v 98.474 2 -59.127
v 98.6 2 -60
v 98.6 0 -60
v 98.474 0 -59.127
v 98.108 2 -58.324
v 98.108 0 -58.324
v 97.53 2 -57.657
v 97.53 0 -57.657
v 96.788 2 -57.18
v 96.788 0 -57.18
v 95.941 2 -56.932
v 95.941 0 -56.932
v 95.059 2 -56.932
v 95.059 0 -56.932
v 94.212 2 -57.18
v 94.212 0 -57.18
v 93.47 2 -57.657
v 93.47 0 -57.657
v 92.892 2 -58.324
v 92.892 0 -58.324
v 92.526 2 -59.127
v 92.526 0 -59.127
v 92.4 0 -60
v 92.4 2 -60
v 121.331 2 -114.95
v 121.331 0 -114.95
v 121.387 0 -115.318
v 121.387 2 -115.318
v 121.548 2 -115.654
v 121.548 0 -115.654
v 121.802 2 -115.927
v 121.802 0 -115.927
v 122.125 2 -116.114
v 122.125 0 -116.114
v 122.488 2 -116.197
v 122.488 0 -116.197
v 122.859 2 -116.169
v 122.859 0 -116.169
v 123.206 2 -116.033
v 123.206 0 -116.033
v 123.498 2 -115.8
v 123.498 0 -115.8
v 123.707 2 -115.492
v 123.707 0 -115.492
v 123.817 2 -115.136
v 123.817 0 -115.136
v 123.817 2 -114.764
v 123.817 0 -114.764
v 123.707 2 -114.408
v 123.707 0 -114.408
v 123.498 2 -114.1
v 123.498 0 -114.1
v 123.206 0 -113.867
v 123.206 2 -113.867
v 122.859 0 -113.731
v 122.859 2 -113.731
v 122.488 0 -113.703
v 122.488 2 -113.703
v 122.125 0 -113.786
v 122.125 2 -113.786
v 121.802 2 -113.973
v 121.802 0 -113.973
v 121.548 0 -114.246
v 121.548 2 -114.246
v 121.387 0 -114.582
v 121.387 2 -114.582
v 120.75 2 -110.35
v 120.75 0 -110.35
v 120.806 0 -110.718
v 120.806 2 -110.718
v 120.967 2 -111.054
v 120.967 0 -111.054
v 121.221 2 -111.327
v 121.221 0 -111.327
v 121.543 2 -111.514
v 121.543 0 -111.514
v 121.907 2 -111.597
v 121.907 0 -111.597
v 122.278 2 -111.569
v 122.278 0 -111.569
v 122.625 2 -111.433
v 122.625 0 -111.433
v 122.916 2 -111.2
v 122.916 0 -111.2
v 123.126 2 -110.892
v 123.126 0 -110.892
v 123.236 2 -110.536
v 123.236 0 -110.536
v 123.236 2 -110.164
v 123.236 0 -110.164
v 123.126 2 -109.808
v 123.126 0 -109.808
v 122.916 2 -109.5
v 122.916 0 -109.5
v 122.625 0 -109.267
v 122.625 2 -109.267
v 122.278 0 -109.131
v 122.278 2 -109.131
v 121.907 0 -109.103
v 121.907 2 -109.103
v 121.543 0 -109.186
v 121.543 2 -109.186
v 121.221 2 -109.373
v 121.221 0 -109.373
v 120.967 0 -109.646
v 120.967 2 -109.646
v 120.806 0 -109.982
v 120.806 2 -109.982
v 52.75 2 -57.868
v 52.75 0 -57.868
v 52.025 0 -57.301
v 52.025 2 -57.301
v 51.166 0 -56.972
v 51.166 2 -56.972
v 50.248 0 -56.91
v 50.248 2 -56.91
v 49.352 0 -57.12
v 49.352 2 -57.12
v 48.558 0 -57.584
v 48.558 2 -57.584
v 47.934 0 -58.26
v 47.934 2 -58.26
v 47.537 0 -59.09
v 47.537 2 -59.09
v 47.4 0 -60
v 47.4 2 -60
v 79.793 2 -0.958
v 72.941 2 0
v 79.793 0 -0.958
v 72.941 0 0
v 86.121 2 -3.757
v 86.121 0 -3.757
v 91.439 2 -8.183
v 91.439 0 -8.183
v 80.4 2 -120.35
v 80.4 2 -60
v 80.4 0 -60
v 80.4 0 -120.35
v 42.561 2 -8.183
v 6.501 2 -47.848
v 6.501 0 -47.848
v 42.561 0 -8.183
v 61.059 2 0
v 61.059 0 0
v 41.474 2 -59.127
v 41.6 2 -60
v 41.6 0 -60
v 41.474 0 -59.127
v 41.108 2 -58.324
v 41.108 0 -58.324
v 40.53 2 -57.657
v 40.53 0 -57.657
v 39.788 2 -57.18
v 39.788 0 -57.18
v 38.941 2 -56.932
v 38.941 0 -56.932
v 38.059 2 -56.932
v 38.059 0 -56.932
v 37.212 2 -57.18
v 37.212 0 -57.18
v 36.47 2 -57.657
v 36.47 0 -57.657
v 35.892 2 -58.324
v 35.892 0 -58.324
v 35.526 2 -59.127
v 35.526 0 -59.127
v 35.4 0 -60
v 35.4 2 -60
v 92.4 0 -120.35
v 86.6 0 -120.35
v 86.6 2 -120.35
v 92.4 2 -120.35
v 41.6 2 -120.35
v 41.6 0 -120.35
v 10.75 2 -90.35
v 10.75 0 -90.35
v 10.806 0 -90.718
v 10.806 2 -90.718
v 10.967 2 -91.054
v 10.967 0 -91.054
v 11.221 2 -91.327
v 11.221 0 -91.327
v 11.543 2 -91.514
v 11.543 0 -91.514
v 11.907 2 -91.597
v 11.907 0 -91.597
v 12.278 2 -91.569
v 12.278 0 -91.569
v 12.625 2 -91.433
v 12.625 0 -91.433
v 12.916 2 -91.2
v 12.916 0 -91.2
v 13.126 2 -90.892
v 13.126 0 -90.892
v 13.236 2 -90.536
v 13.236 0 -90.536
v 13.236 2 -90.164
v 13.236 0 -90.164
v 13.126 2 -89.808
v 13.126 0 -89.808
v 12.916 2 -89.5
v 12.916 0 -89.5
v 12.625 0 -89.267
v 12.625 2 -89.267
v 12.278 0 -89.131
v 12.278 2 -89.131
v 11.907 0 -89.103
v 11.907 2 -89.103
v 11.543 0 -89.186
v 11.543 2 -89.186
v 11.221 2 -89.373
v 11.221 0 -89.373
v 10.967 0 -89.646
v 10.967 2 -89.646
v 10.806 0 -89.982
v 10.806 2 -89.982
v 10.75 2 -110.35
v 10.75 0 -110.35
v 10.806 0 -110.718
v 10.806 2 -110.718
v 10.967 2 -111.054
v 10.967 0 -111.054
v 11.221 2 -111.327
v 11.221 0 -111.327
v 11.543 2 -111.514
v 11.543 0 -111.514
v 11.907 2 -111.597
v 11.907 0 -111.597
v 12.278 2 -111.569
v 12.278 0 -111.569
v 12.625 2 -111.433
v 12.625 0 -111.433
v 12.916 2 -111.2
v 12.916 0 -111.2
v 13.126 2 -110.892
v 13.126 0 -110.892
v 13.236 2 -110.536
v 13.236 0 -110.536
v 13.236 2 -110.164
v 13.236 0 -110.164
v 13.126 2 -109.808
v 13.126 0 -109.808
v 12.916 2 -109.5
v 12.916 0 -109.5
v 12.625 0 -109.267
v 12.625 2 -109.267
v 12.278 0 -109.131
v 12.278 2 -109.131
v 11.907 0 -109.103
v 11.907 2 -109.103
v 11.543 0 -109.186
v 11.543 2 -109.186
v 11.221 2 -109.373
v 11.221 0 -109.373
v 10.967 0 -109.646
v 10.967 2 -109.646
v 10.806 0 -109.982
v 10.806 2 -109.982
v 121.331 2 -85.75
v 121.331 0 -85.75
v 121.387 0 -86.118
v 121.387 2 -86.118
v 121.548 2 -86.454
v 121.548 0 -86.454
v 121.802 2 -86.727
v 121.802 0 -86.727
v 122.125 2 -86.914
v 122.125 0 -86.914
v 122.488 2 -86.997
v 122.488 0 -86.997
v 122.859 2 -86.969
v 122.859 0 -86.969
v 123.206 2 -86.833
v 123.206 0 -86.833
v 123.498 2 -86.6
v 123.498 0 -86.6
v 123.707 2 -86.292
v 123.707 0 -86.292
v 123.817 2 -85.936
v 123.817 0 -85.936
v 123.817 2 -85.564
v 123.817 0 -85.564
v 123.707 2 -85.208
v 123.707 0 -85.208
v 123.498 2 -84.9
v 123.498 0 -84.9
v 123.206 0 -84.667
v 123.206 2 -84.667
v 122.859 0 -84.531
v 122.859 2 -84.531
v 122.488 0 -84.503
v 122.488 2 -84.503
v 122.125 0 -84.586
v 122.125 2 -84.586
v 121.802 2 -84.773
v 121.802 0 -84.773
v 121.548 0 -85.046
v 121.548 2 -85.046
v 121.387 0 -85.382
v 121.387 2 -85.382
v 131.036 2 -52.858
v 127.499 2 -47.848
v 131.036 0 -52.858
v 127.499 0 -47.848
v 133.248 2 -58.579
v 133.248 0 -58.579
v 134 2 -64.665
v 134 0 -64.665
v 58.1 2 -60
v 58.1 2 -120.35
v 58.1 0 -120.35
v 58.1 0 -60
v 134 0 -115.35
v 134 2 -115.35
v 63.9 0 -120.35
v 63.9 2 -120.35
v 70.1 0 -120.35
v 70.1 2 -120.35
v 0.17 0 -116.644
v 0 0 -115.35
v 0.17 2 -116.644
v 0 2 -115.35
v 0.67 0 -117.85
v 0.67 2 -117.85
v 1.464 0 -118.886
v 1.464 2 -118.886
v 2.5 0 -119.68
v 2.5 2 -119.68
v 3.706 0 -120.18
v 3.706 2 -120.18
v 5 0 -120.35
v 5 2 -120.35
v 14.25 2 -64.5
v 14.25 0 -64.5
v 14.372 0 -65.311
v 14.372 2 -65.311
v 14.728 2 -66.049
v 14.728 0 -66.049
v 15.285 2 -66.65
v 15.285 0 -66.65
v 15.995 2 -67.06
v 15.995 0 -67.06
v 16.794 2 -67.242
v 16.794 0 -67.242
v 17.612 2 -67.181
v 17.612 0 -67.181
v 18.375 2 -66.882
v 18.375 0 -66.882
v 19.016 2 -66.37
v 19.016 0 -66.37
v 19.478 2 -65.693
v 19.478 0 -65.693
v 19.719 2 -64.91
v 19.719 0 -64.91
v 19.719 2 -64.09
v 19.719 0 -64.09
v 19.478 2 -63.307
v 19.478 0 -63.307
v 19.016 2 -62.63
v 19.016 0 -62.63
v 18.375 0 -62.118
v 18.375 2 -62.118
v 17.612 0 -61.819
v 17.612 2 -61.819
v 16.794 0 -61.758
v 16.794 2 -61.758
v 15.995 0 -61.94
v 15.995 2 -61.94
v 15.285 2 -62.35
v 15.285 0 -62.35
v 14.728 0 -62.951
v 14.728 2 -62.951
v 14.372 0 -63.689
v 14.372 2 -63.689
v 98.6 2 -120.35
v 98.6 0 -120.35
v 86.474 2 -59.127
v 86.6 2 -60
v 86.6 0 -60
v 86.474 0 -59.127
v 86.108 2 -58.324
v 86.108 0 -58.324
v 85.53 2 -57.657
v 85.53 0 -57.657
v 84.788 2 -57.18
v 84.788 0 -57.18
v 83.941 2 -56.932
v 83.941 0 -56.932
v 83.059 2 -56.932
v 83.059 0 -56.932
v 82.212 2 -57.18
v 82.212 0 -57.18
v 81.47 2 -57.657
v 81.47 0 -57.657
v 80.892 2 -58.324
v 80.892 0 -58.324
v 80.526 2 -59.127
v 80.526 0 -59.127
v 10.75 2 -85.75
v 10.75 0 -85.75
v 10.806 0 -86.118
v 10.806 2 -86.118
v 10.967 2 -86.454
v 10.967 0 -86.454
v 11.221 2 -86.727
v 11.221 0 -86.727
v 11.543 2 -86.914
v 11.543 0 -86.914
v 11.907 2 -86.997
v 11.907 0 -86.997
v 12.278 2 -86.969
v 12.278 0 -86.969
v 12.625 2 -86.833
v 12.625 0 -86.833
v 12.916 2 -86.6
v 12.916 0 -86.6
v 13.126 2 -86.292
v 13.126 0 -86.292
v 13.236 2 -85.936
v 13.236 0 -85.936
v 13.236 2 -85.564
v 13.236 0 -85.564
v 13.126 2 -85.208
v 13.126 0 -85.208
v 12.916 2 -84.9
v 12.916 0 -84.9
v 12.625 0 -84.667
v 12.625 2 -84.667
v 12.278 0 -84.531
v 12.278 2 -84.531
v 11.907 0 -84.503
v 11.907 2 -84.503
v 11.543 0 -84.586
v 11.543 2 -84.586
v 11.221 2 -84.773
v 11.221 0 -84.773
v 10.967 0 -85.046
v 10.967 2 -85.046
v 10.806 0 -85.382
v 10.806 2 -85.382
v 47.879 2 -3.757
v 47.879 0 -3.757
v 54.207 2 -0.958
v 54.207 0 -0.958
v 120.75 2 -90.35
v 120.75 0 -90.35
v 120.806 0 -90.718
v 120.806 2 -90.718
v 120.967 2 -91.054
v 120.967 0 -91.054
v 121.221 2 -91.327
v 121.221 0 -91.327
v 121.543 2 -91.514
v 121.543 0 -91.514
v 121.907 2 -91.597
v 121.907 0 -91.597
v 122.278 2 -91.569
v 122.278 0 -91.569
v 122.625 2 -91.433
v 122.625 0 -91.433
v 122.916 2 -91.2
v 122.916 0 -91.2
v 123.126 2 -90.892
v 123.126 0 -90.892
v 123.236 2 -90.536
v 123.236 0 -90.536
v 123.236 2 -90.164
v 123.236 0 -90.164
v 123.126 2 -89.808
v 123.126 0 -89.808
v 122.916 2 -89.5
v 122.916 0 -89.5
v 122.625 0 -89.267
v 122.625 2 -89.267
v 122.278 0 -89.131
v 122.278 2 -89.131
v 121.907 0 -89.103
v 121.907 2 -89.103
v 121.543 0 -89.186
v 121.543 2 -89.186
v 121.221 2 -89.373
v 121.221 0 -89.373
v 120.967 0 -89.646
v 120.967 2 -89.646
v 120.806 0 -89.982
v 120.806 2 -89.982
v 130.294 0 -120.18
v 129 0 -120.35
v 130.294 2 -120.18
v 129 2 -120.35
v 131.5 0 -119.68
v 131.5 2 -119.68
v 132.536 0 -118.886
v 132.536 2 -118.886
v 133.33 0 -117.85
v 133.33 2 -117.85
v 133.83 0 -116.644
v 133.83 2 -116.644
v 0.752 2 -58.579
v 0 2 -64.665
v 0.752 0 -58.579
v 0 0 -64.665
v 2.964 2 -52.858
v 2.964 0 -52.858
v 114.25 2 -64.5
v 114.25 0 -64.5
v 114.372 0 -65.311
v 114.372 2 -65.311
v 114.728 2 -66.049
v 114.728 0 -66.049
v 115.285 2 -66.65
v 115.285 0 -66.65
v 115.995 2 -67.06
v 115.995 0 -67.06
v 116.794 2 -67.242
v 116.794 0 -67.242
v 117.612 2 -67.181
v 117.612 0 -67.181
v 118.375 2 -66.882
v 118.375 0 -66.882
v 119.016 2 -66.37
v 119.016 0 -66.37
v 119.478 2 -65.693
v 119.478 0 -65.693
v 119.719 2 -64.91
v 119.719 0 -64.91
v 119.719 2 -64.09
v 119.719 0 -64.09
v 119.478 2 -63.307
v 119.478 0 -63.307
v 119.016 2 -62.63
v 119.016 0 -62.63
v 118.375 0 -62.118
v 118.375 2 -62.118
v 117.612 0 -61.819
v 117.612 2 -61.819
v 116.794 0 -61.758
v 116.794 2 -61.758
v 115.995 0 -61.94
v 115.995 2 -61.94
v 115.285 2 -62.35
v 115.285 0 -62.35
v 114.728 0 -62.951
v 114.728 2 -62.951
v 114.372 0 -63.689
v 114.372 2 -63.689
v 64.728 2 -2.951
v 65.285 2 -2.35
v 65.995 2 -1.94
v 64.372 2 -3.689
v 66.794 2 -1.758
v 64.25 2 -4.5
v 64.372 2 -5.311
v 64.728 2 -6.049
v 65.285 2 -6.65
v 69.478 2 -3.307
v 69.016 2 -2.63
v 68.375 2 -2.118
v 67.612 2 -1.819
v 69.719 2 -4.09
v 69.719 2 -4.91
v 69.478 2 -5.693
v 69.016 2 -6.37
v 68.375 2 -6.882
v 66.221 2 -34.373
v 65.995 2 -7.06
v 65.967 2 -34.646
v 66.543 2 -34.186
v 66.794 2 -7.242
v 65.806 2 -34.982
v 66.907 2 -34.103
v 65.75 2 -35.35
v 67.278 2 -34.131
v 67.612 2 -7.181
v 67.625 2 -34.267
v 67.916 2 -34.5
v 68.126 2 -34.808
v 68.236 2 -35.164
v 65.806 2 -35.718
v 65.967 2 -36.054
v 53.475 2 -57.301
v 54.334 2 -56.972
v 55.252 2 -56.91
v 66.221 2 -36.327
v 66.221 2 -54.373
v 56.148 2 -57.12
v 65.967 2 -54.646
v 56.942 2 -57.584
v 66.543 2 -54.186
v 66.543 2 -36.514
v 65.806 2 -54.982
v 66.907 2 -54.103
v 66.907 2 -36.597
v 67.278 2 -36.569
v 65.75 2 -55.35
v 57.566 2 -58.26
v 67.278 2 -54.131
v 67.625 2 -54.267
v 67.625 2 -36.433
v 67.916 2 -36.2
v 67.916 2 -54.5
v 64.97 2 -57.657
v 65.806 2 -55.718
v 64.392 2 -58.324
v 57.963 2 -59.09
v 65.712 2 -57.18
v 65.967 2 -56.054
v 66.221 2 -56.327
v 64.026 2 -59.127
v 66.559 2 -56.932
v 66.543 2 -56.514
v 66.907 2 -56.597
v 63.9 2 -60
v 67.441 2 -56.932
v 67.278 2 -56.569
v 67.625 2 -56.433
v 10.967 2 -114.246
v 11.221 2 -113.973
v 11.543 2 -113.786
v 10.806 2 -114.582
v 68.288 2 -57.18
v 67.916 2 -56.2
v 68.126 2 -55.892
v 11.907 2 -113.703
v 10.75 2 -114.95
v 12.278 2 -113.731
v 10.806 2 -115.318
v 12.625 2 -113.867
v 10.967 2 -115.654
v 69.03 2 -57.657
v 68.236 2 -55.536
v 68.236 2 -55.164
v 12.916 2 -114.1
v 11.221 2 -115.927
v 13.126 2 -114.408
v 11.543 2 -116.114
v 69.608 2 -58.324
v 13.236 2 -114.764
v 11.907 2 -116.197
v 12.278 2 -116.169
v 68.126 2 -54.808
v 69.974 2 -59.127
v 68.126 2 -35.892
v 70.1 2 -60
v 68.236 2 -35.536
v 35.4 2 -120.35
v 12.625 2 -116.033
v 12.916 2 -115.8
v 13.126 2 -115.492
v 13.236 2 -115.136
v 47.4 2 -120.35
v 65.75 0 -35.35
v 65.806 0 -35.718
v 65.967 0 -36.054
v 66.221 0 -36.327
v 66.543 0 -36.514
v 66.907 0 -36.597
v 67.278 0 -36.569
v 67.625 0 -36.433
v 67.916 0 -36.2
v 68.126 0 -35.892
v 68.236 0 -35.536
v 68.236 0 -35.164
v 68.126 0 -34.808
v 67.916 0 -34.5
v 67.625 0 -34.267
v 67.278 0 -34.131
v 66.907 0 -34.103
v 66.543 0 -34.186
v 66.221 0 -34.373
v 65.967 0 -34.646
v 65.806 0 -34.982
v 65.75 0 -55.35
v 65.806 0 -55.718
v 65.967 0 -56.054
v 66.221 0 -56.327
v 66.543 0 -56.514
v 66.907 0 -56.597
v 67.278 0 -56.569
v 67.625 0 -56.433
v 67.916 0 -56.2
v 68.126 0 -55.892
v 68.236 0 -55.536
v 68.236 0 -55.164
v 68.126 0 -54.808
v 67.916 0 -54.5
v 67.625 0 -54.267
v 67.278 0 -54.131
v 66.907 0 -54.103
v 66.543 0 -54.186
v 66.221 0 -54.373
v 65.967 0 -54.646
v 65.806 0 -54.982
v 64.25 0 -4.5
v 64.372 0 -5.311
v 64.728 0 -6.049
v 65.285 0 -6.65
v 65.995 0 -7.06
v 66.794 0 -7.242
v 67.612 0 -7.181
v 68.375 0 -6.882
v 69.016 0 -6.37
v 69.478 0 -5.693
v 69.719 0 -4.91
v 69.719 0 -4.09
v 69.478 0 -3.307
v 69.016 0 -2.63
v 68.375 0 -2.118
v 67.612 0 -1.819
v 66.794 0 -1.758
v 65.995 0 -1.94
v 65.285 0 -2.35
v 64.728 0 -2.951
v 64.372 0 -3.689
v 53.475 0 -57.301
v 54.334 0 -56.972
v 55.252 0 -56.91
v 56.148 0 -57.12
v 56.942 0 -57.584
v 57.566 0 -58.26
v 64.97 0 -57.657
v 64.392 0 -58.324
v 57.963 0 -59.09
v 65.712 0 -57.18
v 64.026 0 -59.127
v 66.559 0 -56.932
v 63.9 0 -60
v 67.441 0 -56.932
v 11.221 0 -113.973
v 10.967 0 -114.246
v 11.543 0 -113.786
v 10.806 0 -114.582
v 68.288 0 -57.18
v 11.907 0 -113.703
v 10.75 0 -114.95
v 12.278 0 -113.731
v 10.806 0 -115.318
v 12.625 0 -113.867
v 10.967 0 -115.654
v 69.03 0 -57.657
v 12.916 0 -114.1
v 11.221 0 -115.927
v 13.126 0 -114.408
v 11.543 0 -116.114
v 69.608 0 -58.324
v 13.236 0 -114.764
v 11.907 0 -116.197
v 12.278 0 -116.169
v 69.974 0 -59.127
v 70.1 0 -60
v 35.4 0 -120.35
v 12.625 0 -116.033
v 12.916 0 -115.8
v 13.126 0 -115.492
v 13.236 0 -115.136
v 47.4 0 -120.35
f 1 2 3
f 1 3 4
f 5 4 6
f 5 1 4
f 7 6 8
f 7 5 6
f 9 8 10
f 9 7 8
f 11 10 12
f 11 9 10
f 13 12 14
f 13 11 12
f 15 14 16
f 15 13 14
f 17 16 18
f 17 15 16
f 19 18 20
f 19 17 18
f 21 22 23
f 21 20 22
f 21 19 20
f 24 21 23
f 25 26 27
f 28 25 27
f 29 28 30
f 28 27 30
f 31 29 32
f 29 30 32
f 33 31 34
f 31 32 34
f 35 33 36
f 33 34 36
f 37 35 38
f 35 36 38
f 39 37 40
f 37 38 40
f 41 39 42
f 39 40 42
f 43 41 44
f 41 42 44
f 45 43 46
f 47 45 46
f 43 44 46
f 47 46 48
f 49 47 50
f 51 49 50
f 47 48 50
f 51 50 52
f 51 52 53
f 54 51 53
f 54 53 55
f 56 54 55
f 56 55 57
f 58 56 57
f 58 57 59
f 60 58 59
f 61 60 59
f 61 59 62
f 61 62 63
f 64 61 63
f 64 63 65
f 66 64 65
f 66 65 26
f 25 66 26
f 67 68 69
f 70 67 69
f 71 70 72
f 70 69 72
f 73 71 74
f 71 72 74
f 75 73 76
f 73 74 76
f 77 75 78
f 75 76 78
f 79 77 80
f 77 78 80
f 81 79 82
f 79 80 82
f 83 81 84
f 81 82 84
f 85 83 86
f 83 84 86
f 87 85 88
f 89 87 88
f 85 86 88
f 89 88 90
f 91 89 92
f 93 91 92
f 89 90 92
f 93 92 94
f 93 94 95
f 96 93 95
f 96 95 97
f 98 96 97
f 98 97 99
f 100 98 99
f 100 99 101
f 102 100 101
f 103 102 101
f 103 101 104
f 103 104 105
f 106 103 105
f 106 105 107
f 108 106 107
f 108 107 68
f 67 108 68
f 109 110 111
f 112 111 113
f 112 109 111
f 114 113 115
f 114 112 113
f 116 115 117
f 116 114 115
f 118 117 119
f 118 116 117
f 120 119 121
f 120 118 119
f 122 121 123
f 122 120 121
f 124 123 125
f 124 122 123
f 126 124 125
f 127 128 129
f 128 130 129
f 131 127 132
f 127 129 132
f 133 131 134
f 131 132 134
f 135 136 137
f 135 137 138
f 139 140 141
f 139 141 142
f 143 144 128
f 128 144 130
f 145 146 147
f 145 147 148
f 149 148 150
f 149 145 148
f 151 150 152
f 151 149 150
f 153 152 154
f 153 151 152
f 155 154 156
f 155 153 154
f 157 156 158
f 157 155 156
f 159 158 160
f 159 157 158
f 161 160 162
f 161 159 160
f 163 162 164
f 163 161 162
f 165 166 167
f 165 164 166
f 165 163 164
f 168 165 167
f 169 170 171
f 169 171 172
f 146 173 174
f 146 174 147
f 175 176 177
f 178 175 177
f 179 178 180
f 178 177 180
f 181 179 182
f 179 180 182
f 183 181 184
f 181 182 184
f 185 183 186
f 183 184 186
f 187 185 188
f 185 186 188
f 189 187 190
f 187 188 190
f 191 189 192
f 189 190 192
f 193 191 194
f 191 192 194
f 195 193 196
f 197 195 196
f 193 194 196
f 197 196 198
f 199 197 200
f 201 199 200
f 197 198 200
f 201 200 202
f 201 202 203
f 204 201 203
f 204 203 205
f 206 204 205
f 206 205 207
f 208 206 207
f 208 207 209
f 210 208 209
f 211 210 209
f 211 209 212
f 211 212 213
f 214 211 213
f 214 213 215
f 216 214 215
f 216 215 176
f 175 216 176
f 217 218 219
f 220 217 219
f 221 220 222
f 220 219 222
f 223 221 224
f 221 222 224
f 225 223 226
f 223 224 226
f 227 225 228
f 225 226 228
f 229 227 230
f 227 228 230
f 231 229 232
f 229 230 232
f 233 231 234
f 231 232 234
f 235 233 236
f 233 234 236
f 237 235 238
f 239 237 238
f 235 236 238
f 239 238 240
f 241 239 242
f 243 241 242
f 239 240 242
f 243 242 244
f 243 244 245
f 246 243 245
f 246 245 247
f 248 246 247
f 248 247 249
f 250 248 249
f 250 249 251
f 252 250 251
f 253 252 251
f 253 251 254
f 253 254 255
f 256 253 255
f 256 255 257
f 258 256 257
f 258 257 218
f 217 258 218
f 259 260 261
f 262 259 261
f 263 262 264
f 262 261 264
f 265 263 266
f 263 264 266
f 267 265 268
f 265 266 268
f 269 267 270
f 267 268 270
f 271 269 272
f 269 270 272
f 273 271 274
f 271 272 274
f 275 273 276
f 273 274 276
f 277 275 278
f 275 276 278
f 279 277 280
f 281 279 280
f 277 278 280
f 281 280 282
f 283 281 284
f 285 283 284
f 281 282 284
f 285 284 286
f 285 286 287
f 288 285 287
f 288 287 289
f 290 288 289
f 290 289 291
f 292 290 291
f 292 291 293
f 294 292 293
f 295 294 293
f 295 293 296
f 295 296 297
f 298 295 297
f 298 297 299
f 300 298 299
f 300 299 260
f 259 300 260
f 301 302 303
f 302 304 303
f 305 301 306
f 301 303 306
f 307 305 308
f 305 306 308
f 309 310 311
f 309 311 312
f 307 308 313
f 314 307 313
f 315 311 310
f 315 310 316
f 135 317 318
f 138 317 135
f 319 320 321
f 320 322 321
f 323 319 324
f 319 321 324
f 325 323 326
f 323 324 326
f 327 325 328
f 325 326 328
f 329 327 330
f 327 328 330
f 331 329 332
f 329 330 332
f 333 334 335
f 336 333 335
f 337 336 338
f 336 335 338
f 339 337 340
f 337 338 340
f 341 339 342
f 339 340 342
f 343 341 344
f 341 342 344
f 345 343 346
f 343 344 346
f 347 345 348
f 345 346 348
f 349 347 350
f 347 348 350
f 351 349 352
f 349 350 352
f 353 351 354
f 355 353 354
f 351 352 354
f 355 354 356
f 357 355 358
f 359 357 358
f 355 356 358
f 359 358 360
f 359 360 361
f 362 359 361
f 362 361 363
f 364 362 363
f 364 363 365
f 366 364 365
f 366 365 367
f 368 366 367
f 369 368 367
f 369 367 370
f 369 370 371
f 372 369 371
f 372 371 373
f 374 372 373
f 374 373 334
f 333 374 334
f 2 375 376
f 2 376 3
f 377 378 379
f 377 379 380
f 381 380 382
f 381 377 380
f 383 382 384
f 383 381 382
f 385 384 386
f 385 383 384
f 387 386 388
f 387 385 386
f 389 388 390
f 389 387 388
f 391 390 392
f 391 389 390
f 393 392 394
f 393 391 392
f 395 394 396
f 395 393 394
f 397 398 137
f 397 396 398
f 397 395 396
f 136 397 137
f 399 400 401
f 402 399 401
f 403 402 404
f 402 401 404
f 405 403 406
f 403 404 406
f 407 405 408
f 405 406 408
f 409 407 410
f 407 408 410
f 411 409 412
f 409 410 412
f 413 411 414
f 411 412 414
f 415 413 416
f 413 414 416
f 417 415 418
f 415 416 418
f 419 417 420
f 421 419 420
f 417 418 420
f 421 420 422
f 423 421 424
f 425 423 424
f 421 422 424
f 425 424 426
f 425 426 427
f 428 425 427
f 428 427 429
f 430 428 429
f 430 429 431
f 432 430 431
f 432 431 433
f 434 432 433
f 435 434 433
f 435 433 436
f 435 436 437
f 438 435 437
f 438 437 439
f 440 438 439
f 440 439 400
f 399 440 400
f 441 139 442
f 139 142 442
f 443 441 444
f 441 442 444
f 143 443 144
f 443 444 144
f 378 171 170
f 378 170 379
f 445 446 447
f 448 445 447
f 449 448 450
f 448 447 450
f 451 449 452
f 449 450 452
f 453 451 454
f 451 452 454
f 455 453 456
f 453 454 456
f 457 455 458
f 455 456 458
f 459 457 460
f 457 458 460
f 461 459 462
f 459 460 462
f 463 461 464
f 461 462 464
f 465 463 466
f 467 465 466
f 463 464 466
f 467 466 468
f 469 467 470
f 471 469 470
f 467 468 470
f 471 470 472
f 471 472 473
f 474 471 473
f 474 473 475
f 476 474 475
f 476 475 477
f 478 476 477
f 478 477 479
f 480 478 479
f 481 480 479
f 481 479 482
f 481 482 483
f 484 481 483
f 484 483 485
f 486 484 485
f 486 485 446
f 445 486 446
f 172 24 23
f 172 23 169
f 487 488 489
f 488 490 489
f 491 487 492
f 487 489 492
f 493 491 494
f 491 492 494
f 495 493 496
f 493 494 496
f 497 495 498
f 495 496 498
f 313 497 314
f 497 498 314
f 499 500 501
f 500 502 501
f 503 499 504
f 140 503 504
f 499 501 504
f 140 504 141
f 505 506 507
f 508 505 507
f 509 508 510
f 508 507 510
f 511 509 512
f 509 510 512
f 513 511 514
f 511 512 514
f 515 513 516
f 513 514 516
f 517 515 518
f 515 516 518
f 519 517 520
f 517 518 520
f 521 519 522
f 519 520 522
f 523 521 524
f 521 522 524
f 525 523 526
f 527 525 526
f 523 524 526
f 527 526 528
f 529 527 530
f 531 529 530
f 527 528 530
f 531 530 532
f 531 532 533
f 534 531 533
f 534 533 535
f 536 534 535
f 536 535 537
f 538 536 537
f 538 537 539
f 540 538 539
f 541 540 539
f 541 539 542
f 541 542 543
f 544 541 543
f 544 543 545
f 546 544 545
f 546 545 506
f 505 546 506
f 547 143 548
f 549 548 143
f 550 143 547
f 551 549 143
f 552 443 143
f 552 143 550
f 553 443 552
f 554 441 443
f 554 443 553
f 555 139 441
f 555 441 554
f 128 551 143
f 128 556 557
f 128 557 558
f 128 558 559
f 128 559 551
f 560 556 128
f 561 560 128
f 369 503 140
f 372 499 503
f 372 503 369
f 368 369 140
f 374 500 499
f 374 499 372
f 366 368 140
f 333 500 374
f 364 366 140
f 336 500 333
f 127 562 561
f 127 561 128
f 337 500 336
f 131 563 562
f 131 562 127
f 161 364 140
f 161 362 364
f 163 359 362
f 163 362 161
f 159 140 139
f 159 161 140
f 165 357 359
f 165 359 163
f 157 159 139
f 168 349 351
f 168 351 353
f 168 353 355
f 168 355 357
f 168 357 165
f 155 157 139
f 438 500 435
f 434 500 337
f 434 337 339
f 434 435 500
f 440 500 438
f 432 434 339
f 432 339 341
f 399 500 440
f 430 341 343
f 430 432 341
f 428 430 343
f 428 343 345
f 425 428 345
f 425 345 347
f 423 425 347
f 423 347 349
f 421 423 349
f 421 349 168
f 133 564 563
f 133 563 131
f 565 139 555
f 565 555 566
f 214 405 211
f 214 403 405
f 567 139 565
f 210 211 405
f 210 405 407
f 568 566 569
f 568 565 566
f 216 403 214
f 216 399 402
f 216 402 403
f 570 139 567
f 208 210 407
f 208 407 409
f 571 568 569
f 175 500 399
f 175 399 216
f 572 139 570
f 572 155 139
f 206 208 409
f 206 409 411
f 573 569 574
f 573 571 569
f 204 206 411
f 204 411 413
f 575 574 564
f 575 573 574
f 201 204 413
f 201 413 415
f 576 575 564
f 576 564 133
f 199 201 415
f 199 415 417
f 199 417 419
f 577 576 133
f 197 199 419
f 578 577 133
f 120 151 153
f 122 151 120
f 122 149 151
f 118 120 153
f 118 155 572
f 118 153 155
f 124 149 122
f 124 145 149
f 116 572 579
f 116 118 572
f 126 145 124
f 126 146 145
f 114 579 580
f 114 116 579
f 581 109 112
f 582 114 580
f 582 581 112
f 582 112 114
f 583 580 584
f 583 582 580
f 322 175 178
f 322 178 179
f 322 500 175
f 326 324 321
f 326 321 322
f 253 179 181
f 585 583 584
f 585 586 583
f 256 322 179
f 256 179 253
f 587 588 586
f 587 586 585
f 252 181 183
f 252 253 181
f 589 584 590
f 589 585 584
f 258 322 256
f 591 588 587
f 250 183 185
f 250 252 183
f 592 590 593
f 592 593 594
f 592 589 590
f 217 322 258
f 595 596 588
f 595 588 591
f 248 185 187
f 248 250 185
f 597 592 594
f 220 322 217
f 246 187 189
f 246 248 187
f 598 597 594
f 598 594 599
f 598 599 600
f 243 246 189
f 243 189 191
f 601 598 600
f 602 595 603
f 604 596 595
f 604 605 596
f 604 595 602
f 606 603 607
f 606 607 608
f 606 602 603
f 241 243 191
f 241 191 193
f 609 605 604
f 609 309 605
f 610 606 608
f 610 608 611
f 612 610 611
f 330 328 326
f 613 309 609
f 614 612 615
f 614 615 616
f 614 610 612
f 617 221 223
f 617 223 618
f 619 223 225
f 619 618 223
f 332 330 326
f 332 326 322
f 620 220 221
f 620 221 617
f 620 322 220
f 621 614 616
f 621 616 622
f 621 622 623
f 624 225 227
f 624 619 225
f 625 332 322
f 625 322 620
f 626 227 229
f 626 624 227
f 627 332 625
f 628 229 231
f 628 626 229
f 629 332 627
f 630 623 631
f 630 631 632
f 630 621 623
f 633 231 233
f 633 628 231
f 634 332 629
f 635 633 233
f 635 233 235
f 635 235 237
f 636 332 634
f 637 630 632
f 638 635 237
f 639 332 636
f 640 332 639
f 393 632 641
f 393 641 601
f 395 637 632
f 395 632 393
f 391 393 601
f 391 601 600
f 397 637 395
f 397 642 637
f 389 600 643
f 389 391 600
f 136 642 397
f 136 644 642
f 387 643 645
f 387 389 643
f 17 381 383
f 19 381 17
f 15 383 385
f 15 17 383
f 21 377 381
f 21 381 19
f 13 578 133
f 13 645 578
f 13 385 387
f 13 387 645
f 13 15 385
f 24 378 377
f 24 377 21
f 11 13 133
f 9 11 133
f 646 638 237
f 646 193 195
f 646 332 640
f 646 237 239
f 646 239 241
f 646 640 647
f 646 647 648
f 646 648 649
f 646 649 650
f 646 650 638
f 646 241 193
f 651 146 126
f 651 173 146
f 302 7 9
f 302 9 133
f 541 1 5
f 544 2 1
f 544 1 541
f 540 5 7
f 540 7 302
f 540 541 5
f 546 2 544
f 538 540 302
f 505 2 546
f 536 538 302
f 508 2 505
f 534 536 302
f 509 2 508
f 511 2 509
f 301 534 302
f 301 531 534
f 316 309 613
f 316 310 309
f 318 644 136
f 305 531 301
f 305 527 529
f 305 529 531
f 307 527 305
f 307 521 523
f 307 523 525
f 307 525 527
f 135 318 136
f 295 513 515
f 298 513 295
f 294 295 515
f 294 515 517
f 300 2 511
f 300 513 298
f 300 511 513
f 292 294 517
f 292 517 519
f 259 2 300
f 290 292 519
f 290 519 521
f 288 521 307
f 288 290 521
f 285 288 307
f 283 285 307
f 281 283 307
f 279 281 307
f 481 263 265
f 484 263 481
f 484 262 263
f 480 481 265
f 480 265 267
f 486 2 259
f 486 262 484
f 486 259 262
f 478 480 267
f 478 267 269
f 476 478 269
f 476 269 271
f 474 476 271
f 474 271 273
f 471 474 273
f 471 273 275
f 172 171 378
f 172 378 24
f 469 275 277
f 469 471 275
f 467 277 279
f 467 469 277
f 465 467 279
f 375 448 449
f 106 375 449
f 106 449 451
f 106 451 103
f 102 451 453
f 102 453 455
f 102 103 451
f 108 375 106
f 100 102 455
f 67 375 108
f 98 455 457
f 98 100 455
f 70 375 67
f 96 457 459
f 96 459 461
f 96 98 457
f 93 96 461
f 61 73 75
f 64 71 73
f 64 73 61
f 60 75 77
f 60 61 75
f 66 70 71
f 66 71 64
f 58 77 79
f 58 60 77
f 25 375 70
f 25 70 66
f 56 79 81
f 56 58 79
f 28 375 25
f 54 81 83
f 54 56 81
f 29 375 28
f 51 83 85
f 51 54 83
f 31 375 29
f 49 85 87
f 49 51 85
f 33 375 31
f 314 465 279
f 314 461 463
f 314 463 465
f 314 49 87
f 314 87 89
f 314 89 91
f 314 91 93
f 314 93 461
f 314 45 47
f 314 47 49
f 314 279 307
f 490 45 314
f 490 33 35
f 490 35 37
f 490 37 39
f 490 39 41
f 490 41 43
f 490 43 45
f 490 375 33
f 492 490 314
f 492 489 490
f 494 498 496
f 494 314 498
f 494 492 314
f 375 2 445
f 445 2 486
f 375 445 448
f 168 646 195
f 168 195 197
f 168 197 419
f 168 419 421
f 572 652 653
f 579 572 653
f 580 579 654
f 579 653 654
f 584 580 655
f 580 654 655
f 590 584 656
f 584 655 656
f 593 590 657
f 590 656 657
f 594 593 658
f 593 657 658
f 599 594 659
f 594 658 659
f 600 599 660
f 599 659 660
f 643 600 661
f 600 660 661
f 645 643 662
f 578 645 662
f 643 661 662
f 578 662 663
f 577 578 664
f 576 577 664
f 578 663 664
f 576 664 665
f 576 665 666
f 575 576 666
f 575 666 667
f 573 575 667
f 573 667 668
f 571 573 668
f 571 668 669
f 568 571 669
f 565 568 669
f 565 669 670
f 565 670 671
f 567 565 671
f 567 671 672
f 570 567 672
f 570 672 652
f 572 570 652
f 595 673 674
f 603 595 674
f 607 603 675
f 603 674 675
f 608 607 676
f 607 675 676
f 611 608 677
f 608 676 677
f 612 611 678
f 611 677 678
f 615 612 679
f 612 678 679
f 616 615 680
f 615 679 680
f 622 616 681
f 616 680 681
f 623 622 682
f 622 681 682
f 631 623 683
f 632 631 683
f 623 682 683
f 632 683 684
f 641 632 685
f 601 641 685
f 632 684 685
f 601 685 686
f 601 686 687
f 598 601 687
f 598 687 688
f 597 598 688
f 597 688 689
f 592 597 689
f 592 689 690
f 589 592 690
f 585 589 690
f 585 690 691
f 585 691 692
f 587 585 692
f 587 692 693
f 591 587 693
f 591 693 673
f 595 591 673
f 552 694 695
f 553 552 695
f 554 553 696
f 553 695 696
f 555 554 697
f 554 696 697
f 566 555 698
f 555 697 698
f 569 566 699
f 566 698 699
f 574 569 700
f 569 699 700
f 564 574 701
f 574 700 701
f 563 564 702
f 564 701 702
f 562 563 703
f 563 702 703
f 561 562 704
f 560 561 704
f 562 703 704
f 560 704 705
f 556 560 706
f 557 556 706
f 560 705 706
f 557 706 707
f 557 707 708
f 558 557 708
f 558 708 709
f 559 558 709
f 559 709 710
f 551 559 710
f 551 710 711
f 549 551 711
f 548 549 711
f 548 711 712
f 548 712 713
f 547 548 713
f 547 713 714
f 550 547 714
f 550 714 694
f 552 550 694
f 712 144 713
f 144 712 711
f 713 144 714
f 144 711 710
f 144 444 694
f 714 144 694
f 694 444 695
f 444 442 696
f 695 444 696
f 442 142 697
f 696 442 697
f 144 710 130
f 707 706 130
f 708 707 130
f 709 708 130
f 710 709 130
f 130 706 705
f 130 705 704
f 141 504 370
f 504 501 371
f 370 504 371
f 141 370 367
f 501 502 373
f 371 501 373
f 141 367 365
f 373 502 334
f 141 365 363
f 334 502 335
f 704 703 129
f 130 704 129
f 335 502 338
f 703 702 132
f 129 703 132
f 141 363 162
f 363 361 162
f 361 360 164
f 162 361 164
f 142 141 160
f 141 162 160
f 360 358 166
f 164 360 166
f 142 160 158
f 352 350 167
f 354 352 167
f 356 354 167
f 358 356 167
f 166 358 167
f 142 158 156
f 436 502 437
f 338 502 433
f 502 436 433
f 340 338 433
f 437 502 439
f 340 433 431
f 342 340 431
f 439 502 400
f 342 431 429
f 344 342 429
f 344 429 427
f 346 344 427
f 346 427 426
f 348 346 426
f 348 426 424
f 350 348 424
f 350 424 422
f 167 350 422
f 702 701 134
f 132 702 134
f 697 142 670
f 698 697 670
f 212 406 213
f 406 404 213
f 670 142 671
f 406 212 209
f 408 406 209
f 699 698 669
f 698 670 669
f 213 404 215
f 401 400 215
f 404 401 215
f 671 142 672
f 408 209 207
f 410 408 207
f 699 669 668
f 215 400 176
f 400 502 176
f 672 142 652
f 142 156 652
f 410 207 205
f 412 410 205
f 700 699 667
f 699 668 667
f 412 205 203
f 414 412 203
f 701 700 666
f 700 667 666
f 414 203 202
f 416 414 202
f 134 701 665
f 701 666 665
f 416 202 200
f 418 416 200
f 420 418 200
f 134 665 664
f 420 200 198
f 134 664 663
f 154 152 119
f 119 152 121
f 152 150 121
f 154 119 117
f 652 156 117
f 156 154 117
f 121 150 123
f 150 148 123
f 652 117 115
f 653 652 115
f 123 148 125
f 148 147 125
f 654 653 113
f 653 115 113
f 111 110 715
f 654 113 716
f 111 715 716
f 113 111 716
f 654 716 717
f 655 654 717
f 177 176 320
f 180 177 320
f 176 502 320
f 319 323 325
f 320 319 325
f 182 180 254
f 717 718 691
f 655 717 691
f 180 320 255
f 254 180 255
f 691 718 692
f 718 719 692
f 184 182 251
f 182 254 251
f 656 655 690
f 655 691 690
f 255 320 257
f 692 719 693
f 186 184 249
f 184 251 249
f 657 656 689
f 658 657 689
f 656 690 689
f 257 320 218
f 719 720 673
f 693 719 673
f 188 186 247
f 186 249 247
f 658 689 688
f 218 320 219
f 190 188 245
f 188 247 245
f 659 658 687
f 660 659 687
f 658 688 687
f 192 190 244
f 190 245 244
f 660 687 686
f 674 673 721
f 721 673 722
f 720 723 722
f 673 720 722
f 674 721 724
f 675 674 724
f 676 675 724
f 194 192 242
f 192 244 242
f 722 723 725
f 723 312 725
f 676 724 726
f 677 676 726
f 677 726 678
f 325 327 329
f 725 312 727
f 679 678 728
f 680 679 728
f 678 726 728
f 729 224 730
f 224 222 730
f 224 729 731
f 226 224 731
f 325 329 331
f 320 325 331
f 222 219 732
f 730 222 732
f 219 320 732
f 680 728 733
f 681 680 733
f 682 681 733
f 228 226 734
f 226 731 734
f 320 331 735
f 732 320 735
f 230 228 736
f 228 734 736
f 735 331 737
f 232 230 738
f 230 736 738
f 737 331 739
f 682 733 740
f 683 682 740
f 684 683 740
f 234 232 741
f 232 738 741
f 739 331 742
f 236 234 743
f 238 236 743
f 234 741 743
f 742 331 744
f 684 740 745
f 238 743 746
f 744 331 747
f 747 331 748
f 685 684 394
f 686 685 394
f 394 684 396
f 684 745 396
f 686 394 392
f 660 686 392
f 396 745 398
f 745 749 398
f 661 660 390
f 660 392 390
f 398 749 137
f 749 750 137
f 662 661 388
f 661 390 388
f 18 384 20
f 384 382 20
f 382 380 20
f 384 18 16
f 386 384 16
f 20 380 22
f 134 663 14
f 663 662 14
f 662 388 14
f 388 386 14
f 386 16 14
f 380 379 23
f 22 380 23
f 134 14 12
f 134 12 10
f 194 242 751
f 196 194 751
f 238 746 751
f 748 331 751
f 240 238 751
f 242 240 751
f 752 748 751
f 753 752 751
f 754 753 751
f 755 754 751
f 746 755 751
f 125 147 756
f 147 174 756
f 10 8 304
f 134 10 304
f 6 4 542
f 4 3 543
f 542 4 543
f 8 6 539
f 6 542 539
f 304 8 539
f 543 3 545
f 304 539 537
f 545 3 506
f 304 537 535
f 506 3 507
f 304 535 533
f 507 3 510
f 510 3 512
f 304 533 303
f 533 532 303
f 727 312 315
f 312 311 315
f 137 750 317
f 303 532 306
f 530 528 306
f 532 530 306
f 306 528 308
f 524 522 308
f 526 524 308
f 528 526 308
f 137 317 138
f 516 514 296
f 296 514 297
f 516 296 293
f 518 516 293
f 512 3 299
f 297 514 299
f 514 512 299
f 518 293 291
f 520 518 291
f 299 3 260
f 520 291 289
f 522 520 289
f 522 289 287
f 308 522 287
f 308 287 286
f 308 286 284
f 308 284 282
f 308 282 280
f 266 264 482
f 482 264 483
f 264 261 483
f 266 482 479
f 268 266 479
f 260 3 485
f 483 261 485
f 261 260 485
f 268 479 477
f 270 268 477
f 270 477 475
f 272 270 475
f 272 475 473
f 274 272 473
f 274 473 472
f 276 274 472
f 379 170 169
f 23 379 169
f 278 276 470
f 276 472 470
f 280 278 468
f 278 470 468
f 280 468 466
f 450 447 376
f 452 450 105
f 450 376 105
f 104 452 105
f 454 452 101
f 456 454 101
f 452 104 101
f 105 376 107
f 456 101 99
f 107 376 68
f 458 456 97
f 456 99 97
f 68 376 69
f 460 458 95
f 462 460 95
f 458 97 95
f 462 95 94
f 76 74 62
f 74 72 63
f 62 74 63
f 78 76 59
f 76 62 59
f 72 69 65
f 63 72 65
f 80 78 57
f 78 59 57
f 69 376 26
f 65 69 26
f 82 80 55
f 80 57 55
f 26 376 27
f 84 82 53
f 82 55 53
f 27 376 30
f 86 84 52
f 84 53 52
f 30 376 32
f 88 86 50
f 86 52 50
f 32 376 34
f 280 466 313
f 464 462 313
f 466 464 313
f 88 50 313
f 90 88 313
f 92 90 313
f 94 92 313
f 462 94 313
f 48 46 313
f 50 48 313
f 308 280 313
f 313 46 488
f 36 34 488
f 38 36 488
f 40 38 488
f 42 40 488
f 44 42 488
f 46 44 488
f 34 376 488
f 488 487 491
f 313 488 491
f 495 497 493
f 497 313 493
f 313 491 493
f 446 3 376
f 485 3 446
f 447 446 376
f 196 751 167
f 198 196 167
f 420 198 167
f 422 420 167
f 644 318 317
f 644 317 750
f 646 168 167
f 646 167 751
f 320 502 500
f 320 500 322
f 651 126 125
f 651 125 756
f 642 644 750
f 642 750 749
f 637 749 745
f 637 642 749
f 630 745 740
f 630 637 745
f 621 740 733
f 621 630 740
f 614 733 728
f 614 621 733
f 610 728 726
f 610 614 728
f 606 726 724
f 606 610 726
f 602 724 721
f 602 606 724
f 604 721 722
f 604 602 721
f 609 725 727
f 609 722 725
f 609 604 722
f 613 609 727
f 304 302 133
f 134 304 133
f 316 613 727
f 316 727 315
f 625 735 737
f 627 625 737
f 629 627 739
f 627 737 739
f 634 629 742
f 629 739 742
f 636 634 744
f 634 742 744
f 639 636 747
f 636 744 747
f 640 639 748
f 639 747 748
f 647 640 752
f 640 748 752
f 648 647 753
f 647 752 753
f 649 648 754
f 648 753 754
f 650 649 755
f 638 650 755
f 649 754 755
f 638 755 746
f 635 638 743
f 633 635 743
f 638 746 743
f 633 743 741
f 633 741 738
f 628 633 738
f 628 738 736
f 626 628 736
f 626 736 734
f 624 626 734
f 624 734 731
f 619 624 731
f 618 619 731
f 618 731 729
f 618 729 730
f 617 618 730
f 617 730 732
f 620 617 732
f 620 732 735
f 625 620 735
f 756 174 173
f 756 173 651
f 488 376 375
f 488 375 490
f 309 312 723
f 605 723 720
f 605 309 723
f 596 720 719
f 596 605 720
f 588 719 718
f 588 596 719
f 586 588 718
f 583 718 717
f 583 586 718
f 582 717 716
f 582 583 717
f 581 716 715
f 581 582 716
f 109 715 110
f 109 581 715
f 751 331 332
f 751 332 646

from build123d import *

# Parameters (mm, degrees)
SKETCH1_W                  = 134
SKETCH1_H                  = 120.35
BOSS_EXTRUDE1_DEPTH        = 2
CUT_EXTRUDE1_DEPTH         = 181.122520802
CUT_EXTRUDE2_DEPTH         = 181.122520802
LINEAR_BEARING_D           = 2.5
BELT_HOLDERS_D             = 2.5
CUT_EXTRUDE3_DEPTH         = 181.122520802
FILLET1_R                  = 5
FILLET2_R                  = 25
F_5_5_5_5_DIAMETER_HOLE1_D = 5.5


with BuildPart() as part:
    # Sketch1 → Boss-Extrude1 (new body)
    with BuildSketch(Plane(origin=(0, 0, 0), x_dir=(1, 0, 0), z_dir=(0, 1, 0))):
        with Locations((67, 60.175)):
            Rectangle(SKETCH1_W, SKETCH1_H)
    extrude(amount=BOSS_EXTRUDE1_DEPTH)

    # Sketch3 → Cut-Extrude1 (cut, through all)
    with BuildSketch(Plane(origin=(0, 2, 0), x_dir=(1, 0, 0), z_dir=(0, 1, 0))):
        with BuildLine():
            Line((86.6, 120.35), (86.6, 60))
            ThreePointArc((86.6, 60), (83.5, 56.9), (80.4, 60))
            Line((80.4, 60), (80.4, 120.35))
            Line((80.4, 120.35), (86.6, 120.35))
        make_face()
        with BuildLine():
            Line((70.1, 120.35), (70.1, 60))
            ThreePointArc((70.1, 60), (67, 56.9), (63.9, 60))
            Line((63.9, 60), (63.9, 120.35))
            Line((63.9, 120.35), (70.1, 120.35))
        make_face()
        with BuildLine():
            Line((98.6, 120.35), (98.6, 60))
            ThreePointArc((98.6, 60), (95.5, 56.9), (92.4, 60))
            Line((92.4, 60), (92.4, 120.35))
            Line((92.4, 120.35), (98.6, 120.35))
        make_face()
        with BuildLine():
            Line((58.1, 120.35), (58.1, 60))
            ThreePointArc((58.1, 60), (55, 56.9), (51.9, 60))
            Line((51.9, 60), (51.9, 120.35))
            Line((51.9, 120.35), (58.1, 120.35))
        make_face()
        with BuildLine():
            Line((41.6, 120.35), (41.6, 60))
            ThreePointArc((41.6, 60), (38.5, 56.9), (35.4, 60))
            Line((35.4, 60), (35.4, 120.35))
            Line((35.4, 120.35), (41.6, 120.35))
        make_face()
    extrude(amount=-CUT_EXTRUDE1_DEPTH, mode=Mode.SUBTRACT)

    # Sketch4 → Cut-Extrude2 (cut, through all)
    with BuildSketch(Plane(origin=(0, 2, 0), x_dir=(1, 0, 0), z_dir=(0, 1, 0))):
        with BuildLine():
            Line((47.4, 120.35), (53.6, 120.35))
            Line((53.6, 120.35), (53.6, 60))
            ThreePointArc((53.6, 60), (50.5, 56.9), (47.4, 60))
            Line((47.4, 60), (47.4, 120.35))
        make_face()
    extrude(amount=-CUT_EXTRUDE2_DEPTH, mode=Mode.SUBTRACT)

    # linear bearing (through all)
    with Locations(Plane(origin=(0, 2, 0), x_dir=(1, 0, 0), z_dir=(0, 1, 0))):
        with Locations((12, 110.35), (12, 90.35), (122, 110.35), (122, 90.35), (67, 55.35), (67, 35.35)):
            Hole(LINEAR_BEARING_D / 2)

    # belt holders (through all)
    with Locations(Plane(origin=(0, 2, 0), x_dir=(1, 0, 0), z_dir=(0, 1, 0))):
        with Locations((12, 114.95), (12, 85.75), (122.58126033, 85.75), (122.58126033, 114.95)):
            Hole(BELT_HOLDERS_D / 2)

    # Sketch9 → Cut-Extrude3 (cut, through all)
    with BuildSketch(Plane(origin=(0, 2, 0), x_dir=(1, 0, 0), z_dir=(0, 1, 0))):
        Polygon((0, 55), (50, 0), (0, 0), align=None)
        Polygon((134, 0), (134, 55), (84, 0), align=None)
    extrude(amount=-CUT_EXTRUDE3_DEPTH, mode=Mode.SUBTRACT)

    # Fillet1
    fillet1_edges = [part.edges().sort_by_distance(p)[0] for p in [
        (0, 1, -120.35),
        (134, 1, -120.35),
    ]]
    fillet(fillet1_edges, radius=FILLET1_R)

    # Fillet2
    fillet2_edges = [part.edges().sort_by_distance(p)[0] for p in [
        (0, 1, -55),
        (50, 1, 0),
        (84, 1, 0),
        (134, 1, -55),
    ]]
    fillet(fillet2_edges, radius=FILLET2_R)

    # Ø5.5 (5.5) Diameter Hole1 (through all)
    with Locations(Plane(origin=(0, 2, 0), x_dir=(1, 0, 0), z_dir=(0, 1, 0))):
        with Locations((67, 4.5), (117, 64.5), (17, 64.5)):
            Hole(F_5_5_5_5_DIAMETER_HOLE1_D / 2)


solid = part.part
